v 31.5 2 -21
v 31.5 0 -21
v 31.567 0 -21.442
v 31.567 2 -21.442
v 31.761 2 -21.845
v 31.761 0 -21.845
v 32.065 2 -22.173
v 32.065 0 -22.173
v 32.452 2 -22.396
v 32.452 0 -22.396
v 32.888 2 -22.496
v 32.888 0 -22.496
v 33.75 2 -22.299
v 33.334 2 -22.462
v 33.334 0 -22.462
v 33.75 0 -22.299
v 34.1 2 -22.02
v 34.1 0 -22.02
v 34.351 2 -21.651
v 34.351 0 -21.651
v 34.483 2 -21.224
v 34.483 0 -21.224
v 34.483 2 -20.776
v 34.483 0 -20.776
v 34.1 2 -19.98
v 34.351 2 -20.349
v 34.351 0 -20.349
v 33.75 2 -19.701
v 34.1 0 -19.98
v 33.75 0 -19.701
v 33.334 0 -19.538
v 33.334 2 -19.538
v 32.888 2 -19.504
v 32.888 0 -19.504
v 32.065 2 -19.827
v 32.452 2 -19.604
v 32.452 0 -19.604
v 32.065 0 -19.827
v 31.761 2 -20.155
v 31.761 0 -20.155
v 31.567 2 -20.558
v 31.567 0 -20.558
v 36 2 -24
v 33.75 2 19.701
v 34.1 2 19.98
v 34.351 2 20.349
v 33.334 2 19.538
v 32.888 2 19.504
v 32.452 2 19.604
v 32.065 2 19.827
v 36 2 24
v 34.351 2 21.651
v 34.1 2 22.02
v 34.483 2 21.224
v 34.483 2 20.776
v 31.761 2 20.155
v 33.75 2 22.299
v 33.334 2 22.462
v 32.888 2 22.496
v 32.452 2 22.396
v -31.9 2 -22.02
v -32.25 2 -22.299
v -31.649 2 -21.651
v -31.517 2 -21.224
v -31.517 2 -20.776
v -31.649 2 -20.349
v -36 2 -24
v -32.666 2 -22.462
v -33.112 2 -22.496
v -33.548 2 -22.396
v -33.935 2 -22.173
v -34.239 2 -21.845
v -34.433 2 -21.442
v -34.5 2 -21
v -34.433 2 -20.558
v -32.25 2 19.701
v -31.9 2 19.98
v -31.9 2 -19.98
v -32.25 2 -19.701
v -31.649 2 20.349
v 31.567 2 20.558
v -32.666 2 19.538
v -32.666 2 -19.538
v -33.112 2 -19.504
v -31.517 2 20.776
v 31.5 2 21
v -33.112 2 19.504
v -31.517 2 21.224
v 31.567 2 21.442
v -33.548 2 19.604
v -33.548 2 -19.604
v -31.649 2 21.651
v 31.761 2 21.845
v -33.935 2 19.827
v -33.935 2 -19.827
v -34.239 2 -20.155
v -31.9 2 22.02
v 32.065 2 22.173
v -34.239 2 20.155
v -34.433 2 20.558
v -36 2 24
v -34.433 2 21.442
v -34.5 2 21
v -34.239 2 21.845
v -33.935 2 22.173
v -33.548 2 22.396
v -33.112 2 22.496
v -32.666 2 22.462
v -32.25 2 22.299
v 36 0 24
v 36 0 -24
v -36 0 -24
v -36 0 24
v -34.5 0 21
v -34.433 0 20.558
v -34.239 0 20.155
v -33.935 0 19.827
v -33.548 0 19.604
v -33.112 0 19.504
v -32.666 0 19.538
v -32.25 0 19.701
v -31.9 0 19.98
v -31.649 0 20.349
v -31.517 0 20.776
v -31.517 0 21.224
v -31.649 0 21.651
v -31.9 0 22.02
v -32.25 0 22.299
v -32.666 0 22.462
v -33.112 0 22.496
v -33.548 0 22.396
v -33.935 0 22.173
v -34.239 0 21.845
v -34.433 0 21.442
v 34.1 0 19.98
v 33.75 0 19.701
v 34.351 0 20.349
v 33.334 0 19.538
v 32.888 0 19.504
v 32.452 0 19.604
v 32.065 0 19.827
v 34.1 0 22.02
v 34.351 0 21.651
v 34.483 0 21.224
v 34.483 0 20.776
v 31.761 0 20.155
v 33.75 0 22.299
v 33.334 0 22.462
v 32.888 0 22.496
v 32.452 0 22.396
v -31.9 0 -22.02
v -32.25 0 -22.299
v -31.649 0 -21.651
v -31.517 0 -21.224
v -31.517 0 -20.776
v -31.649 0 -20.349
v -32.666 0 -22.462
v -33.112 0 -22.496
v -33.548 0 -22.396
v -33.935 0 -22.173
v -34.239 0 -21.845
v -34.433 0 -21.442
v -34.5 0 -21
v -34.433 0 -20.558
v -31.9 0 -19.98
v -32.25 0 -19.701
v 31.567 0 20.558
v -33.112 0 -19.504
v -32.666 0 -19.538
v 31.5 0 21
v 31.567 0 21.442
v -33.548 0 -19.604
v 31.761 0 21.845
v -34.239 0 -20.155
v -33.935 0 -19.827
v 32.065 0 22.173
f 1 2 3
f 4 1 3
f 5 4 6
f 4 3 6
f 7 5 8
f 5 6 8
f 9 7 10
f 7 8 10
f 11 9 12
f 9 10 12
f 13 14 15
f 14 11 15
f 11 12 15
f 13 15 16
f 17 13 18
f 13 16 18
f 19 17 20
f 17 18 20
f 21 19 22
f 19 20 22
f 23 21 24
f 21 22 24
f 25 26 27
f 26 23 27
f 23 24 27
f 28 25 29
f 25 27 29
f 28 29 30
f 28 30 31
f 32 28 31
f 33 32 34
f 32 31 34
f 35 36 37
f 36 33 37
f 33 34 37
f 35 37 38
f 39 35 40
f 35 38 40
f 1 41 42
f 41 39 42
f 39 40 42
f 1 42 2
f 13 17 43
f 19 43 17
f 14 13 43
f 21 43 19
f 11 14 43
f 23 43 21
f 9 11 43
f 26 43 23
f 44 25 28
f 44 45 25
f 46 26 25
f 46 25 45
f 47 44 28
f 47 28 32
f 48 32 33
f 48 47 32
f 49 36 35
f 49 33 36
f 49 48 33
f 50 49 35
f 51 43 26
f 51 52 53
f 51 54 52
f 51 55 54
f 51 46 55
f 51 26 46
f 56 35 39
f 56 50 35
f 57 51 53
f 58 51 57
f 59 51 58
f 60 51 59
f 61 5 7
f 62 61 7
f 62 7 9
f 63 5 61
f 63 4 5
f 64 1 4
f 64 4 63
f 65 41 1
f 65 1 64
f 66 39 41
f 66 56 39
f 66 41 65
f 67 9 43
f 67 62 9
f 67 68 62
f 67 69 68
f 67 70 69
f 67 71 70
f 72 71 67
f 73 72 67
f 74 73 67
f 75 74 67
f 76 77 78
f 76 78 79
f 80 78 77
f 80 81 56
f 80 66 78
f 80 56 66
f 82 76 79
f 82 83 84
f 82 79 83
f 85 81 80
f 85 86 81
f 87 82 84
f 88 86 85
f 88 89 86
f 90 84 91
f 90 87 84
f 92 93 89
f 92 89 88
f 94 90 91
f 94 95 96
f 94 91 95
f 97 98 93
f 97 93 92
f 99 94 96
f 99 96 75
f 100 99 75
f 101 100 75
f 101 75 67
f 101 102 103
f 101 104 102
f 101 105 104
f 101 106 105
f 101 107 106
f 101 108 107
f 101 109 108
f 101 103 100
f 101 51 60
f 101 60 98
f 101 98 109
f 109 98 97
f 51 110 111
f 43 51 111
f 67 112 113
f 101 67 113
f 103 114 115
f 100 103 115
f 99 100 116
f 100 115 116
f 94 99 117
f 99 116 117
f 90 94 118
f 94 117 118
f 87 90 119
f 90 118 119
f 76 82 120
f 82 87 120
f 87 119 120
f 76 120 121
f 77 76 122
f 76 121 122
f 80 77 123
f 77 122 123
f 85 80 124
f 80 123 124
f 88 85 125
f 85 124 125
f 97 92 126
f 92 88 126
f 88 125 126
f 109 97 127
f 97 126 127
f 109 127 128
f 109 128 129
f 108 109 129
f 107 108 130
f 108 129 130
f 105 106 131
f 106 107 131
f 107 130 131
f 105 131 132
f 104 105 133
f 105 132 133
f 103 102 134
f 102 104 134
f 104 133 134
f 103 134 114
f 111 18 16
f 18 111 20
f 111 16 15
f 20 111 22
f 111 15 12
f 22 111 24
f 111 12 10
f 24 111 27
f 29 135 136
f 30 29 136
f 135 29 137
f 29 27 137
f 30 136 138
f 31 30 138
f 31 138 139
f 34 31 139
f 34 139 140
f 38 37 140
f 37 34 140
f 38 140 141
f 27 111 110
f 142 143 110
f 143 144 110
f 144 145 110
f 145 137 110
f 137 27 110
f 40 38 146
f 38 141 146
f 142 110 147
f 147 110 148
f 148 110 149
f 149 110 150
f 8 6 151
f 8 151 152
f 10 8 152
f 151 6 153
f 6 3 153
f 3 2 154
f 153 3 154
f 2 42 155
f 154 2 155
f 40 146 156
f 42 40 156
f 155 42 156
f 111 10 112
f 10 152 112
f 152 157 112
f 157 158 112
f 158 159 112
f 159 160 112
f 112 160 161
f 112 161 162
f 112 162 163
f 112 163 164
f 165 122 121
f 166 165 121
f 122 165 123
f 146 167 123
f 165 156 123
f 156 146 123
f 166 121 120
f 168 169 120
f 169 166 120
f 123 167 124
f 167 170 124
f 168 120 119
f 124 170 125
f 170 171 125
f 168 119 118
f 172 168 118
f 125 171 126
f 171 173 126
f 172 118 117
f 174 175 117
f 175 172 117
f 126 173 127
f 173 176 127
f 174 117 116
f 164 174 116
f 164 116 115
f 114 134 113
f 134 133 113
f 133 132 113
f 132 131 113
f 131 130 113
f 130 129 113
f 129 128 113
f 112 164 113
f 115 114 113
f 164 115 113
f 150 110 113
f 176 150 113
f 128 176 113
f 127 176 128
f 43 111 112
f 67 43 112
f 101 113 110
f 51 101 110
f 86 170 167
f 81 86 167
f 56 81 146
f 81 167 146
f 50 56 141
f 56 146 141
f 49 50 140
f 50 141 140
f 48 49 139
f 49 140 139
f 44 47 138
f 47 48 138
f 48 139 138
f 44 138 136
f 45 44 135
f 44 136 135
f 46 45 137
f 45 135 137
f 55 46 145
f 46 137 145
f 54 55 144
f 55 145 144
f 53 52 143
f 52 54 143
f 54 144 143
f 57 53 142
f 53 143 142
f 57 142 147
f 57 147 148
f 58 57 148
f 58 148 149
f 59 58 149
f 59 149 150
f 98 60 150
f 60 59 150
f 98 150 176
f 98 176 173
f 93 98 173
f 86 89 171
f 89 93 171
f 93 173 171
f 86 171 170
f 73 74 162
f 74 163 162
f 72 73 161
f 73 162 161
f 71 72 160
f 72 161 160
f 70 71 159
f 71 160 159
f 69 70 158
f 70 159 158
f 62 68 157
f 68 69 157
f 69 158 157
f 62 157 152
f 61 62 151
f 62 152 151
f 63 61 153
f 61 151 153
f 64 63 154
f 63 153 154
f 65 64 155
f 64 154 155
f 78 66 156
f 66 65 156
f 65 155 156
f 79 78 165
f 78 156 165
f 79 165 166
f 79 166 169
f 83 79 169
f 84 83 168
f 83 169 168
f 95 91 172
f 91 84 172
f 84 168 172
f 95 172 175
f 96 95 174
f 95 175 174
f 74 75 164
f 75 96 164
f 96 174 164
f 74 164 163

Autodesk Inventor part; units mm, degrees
ref_plane "YZ Plane" through (0, 0, 0) normal (1, 0, 0) x (0, 1, 0)
ref_plane "XZ Plane" through (0, 0, 0) normal (0, 1, 0) x (-1, 0, 0)
ref_plane "XY Plane" through (0, 0, 0) normal (0, 0, 1) x (1, 0, 0)
sketch "スケッチ1" plane through (0, 0, 0) normal (0, 1, 0) x (-1, 0, 0)
  line L0 (36, 24) -> (-36, 24)
  line L1 (-36, 24) -> (-36, -24)
  line L2 (-36, -24) -> (36, -24)
  line L3 (36, -24) -> (36, 24)
  line L4 (36, 24) -> (-36, -24) construction
  line L5 (-36, 24) -> (36, -24) construction
  circle A0 centre (33, 21) radius 1.5
  line L6 (50.4, 0) -> (-50.4, 0) construction
  circle A1 centre (33, -21) radius 1.5
  line L7 (0, -33.6) -> (0, 33.6) construction
  circle A2 centre (-33, 21) radius 1.5
  circle A3 centre (-33, -21) radius 1.5
  point P0 (0, 0)
  dimension "d0" = 48
  dimension "d1" = 72
  dimension "d2" = 3
  dimension "d3" = 3
  dimension "d4" = 42
extrude "押し出し1" add sketch "スケッチ1" along normal blind 2
properties part number "circuitboard"
